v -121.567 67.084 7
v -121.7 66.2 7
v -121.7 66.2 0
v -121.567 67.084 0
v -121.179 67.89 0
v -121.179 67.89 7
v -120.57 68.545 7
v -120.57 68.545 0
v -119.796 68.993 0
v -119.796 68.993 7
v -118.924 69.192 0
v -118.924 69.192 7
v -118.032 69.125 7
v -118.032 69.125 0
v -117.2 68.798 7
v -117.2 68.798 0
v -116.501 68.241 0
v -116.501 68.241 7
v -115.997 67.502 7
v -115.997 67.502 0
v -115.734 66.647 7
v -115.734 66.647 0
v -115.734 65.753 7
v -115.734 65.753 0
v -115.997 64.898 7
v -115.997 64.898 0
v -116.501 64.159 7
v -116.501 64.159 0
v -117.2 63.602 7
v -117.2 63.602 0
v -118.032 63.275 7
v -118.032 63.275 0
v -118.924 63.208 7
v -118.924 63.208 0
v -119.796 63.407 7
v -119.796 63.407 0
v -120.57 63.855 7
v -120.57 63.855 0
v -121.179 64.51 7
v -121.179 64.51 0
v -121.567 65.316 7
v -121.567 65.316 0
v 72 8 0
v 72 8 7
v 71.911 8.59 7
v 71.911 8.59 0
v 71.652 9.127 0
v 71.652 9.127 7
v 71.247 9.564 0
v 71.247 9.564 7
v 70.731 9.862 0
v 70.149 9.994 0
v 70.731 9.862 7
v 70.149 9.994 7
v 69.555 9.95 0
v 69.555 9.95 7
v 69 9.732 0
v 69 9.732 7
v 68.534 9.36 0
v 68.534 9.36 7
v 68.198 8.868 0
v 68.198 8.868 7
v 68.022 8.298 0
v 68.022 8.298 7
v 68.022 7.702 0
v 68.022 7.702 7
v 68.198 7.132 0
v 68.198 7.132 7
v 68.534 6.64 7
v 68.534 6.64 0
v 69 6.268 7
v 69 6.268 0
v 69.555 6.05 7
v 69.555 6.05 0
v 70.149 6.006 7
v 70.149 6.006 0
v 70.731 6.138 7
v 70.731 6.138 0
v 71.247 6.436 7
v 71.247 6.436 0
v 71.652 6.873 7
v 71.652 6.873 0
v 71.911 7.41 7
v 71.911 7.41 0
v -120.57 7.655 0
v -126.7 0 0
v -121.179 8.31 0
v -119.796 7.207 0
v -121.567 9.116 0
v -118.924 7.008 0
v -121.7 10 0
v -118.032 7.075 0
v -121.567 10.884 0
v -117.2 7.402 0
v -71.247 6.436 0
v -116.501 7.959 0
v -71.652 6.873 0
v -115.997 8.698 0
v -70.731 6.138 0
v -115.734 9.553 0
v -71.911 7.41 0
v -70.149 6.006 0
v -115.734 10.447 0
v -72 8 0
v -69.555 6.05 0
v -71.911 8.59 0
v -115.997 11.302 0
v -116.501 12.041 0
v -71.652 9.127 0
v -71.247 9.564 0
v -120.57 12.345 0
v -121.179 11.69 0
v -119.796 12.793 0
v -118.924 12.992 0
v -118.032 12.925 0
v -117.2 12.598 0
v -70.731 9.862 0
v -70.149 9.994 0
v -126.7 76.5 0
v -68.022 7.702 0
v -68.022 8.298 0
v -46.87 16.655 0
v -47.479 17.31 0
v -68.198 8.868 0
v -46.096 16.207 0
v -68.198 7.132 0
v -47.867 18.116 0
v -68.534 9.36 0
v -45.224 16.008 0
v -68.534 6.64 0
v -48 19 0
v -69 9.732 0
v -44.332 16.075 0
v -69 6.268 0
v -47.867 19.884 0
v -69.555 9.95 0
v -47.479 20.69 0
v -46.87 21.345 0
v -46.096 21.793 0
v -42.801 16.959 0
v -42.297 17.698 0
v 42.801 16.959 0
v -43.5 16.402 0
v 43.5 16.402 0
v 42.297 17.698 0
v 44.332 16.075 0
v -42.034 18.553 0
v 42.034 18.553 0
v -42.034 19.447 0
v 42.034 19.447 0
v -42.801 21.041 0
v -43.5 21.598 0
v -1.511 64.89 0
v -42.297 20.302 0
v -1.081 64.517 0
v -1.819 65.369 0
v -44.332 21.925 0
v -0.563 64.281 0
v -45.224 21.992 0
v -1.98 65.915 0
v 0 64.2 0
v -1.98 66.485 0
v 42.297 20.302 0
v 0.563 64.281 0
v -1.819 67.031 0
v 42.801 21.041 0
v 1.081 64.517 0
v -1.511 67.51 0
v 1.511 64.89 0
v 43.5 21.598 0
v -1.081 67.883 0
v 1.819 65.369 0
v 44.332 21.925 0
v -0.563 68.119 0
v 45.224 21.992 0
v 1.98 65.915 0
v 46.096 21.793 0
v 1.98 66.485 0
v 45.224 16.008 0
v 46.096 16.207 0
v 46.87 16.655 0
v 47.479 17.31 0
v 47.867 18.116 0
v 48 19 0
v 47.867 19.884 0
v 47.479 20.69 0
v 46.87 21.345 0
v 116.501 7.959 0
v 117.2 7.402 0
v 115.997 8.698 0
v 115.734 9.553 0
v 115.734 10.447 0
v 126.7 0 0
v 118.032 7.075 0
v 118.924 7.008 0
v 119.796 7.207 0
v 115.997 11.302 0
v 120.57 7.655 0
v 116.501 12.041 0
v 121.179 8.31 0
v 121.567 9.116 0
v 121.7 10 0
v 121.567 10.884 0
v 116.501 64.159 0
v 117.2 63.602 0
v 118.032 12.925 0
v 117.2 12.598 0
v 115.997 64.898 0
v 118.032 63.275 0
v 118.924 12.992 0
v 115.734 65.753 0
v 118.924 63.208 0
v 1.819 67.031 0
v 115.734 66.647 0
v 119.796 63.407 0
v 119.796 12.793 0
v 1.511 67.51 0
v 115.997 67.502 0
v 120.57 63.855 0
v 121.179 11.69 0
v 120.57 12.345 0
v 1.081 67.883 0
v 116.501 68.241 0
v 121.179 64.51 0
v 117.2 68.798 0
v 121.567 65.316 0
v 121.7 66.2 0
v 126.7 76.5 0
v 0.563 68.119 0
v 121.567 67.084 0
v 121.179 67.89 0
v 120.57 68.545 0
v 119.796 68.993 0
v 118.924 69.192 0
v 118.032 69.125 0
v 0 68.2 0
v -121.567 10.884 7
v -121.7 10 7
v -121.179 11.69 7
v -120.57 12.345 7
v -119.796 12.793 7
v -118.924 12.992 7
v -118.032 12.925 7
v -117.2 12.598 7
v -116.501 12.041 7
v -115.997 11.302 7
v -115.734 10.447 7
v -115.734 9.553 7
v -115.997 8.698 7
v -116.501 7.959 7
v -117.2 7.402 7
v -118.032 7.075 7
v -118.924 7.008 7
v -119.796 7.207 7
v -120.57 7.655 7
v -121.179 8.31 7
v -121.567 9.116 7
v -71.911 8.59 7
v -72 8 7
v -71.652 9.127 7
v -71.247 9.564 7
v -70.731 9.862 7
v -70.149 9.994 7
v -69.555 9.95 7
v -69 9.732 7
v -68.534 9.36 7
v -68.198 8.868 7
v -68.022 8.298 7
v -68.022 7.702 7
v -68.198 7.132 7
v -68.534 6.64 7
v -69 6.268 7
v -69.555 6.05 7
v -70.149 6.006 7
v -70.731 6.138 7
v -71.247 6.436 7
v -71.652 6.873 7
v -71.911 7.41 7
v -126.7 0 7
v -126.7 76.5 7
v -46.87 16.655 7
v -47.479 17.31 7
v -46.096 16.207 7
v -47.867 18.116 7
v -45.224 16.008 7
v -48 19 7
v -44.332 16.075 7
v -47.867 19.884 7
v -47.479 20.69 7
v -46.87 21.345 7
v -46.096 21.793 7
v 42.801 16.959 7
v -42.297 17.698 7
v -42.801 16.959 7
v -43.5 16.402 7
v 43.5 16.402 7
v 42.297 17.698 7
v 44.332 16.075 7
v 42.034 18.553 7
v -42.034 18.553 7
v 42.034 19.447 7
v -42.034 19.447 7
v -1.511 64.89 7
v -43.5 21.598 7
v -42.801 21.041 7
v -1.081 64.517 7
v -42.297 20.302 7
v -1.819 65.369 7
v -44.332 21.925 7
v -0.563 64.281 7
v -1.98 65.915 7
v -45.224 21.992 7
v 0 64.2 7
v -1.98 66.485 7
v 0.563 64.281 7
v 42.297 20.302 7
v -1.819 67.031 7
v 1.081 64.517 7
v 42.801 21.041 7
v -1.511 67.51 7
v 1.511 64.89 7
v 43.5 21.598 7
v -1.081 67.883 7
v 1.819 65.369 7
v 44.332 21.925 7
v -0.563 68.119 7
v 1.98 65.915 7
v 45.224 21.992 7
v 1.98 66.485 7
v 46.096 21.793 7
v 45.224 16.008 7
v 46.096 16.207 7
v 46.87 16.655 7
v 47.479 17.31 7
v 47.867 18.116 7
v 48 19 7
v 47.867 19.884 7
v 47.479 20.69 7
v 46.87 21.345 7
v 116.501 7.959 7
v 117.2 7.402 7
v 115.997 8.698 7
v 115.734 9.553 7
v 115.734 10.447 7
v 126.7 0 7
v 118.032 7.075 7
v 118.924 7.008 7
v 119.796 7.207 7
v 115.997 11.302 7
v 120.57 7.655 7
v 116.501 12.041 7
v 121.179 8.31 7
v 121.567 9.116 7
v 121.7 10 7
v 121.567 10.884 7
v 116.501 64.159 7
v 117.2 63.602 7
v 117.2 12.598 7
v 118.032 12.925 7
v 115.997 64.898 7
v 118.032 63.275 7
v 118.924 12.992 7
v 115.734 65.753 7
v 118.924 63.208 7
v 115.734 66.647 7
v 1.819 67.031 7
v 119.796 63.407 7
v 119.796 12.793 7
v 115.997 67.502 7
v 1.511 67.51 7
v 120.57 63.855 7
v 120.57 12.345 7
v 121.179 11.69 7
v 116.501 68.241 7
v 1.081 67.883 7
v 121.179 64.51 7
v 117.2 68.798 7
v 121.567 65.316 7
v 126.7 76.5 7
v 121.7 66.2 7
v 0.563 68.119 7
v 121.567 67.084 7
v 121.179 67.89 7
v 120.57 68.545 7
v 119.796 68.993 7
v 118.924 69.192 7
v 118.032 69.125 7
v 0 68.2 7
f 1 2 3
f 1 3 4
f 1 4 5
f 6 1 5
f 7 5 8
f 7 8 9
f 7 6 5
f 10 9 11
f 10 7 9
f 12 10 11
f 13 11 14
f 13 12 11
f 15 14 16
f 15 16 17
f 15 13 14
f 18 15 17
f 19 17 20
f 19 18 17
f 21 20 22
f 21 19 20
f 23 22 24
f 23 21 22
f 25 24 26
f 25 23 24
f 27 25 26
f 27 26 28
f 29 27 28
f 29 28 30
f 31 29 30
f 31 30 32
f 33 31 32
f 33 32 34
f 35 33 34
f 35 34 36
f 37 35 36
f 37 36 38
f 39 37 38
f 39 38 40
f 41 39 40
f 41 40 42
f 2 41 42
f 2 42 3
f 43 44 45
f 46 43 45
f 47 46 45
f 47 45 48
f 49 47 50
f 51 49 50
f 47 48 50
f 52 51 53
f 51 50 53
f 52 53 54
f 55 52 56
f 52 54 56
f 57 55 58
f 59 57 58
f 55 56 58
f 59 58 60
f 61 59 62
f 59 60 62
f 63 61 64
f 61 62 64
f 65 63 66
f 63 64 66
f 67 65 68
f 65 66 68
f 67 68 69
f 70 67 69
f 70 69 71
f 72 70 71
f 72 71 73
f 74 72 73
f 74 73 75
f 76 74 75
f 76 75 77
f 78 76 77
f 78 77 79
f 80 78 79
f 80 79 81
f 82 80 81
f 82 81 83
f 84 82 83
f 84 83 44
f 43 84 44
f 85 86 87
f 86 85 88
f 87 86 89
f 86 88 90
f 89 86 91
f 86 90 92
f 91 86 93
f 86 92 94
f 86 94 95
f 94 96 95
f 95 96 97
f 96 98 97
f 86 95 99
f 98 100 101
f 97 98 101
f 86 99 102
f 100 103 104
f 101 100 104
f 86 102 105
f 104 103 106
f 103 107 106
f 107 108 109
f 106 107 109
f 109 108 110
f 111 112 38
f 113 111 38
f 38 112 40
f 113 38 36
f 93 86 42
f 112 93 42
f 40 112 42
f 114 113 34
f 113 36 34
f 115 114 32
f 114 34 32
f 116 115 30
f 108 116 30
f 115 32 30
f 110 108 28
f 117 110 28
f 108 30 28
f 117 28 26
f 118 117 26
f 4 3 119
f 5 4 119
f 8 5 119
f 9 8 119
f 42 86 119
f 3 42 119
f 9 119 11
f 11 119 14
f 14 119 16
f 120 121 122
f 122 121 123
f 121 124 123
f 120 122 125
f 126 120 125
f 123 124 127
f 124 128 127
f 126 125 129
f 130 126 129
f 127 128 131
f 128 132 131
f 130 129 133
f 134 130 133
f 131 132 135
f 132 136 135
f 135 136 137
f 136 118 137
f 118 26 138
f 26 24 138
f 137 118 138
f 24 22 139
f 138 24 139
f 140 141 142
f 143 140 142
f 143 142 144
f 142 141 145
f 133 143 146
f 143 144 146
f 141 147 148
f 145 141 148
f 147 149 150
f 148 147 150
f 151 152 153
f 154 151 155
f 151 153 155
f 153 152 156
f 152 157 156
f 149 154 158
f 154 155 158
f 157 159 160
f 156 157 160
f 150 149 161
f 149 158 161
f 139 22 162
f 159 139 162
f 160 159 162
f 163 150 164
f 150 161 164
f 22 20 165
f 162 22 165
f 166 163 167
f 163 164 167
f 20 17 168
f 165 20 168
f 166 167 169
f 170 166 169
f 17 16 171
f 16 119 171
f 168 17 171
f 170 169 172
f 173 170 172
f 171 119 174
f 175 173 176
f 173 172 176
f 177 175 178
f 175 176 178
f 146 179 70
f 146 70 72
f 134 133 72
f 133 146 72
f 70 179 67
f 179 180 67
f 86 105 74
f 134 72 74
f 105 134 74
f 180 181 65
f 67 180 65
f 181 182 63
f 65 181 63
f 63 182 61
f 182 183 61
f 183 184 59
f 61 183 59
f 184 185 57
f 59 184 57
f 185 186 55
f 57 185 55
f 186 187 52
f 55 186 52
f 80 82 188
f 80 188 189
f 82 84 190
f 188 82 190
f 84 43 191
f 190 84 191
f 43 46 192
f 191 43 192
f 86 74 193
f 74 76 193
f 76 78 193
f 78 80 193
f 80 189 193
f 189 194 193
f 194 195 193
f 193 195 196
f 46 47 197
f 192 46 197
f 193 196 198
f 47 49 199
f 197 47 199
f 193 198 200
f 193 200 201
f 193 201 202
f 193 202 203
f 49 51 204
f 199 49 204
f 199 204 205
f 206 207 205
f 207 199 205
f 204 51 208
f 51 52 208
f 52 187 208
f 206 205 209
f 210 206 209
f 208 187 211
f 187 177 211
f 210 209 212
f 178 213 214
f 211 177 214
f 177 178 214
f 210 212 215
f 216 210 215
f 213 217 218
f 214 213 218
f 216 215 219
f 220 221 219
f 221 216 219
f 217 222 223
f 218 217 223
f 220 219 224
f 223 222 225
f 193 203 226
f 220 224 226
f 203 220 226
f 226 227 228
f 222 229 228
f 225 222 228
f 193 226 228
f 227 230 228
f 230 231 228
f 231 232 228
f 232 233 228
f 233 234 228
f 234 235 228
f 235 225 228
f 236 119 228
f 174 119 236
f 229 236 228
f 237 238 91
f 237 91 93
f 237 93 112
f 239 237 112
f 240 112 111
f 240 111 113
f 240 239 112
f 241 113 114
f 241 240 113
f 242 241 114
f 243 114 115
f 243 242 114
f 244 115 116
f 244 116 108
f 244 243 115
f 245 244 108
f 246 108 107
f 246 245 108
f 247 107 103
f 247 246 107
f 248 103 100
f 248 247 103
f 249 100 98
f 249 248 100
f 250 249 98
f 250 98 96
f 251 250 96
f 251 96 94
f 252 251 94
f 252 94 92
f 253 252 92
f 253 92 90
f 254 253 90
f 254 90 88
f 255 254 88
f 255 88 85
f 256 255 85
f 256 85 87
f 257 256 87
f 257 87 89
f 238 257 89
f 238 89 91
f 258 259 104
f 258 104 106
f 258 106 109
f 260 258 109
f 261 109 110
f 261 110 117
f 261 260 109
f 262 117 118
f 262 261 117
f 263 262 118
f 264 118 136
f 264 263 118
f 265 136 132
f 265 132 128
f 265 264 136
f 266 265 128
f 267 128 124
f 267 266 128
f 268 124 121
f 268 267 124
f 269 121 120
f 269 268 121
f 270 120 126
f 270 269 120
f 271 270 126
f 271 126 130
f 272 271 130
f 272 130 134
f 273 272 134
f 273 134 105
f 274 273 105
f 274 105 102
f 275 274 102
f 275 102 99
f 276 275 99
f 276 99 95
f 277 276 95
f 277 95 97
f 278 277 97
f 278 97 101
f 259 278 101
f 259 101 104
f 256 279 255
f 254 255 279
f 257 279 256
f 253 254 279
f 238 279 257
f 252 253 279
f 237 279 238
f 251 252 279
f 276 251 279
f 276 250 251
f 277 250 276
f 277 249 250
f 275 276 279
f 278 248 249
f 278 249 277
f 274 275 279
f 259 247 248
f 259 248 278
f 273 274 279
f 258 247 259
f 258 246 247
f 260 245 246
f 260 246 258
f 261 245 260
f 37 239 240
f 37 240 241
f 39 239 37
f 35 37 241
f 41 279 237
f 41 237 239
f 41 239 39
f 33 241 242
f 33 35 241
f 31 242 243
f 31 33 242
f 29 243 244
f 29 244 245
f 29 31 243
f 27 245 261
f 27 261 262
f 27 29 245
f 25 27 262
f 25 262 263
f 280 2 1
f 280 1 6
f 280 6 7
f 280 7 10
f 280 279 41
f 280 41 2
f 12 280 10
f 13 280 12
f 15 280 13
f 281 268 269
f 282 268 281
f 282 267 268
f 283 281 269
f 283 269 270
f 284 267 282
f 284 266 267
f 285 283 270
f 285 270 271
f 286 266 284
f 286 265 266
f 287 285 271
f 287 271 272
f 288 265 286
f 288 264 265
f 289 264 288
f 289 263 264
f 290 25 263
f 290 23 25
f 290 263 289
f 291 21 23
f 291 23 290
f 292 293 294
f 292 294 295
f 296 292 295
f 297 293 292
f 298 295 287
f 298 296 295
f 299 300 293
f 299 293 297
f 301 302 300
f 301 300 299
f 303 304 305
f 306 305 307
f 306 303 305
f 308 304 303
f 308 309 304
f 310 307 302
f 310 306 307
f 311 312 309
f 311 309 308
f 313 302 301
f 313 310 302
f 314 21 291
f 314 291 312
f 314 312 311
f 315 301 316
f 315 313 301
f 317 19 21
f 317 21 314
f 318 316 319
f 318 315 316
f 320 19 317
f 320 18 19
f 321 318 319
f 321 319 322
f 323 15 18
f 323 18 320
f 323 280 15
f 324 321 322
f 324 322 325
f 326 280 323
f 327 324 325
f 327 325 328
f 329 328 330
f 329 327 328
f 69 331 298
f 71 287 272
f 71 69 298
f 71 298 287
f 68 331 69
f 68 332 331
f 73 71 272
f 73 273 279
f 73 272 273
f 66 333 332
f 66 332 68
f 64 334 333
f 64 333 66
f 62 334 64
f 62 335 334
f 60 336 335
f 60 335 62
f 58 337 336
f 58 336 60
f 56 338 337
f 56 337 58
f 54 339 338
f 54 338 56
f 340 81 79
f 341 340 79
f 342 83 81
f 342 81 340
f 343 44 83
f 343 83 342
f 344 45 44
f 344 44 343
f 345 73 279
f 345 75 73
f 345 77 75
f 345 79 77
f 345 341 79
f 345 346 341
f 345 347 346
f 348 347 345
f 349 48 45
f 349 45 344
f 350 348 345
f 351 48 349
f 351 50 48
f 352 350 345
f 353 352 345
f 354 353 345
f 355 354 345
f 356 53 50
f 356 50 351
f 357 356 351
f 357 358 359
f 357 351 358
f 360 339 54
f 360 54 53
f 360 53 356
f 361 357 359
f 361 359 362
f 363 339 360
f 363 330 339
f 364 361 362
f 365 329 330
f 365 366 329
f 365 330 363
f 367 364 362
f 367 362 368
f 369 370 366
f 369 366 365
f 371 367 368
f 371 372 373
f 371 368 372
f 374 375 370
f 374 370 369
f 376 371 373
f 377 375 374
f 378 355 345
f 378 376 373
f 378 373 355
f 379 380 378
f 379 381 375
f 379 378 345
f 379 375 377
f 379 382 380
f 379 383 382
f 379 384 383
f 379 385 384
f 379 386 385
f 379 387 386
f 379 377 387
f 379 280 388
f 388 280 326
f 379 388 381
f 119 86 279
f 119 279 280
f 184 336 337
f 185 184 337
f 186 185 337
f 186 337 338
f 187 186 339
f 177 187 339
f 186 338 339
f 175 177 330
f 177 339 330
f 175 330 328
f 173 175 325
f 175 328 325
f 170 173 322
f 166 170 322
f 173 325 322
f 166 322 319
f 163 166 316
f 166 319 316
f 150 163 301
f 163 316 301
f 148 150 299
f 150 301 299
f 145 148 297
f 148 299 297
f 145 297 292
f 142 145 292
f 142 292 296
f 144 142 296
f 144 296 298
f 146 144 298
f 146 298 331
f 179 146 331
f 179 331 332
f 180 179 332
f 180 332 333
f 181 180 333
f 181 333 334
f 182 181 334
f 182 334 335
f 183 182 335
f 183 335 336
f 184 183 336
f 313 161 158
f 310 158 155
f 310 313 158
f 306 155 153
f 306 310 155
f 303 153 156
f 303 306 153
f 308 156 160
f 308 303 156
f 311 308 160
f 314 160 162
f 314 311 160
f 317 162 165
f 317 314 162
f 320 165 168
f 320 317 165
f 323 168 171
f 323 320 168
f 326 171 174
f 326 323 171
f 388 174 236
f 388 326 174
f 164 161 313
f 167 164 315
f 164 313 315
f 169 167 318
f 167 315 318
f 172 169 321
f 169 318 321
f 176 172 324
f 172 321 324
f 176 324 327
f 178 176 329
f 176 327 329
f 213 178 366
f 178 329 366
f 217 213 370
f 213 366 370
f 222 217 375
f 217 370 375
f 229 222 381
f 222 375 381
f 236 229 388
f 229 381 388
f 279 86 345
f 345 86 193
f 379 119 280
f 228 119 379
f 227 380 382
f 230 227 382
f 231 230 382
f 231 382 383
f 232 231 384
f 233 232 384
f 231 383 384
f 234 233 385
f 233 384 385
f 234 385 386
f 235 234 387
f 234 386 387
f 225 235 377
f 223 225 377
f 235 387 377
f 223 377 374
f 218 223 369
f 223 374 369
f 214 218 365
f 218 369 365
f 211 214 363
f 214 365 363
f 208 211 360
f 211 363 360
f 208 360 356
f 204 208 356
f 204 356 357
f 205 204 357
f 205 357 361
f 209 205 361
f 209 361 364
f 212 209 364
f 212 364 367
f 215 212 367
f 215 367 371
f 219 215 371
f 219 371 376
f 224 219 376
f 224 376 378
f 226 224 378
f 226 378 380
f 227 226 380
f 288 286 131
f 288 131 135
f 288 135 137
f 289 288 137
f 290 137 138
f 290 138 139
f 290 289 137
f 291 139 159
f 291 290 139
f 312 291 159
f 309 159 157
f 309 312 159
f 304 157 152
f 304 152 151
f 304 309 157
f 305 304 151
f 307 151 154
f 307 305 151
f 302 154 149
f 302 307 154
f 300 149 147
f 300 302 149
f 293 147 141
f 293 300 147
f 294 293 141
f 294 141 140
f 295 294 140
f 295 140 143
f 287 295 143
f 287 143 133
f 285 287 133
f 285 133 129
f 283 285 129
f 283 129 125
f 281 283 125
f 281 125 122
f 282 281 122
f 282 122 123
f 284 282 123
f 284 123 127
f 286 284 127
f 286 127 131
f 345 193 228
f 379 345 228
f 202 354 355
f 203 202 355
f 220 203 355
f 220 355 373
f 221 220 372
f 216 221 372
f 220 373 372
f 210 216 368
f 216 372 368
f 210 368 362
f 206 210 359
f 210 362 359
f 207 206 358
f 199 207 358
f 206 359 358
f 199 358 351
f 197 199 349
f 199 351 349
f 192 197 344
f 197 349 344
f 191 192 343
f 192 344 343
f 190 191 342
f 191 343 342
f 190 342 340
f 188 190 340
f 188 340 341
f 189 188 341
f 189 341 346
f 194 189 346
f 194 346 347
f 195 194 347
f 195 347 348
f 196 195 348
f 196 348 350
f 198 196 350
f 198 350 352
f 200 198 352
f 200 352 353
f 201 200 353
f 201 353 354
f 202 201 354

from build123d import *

# Parameters (mm, degrees)
SKETCH_W      = 126.7
SKETCH_H      = 76.5
PAD_DEPTH     = 7
SKETCH001_R   = 2
SKETCH001_R_2 = 3
POCKET_DEPTH  = 50


with BuildPart() as pocket:
    # Sketch → Pad (new body)
    with BuildSketch(Plane.XY):
        with Locations((63.35, 38.25)):
            Rectangle(SKETCH_W, SKETCH_H)
    extrude(amount=PAD_DEPTH)

    # Sketch001 → Pocket (cut)
    with BuildSketch(Plane.XY.offset(7)):
        with Locations((0, 66.2)):
            Circle(SKETCH001_R)
        with Locations((70, 8)):
            Circle(SKETCH001_R)
        with Locations((118.7, 66.2)):
            Circle(SKETCH001_R_2)
        with Locations((118.7, 10)):
            Circle(SKETCH001_R_2)
        with Locations((45, 19)):
            Circle(SKETCH001_R_2)
    extrude(amount=-POCKET_DEPTH, mode=Mode.SUBTRACT)


with BuildPart() as fusion:
    # Part__Mirroring: instance of Pocket
    add(pocket.part.mirror(Plane(origin=(0, 0, 0), x_dir=(0, -1, 0), z_dir=(1, 0, 0))))

    # Fusion: union Pocket
    add(pocket.part)


solid = fusion.part
